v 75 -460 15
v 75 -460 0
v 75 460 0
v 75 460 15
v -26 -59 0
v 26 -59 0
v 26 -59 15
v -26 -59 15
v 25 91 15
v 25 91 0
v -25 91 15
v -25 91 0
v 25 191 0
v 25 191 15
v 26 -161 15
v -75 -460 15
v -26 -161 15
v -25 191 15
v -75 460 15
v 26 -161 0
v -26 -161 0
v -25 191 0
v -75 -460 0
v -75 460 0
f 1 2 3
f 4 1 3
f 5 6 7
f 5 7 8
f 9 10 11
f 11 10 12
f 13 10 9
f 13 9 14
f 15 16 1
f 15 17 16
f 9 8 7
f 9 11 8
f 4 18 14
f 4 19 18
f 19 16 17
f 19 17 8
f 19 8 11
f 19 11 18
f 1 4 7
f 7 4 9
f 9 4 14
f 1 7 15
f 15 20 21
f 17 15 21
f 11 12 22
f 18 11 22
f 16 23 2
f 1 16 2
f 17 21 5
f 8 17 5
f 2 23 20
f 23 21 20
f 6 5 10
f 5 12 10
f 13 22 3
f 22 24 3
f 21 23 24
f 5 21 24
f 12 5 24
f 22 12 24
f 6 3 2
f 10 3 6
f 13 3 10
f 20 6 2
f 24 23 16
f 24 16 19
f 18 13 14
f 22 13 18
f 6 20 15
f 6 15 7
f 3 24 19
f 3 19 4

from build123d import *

# Parameters (mm, degrees)
CROQUIS1_W              = 150
CROQUIS1_H              = 920
SALIENTE_EXTRUIR1_DEPTH = 15
CROQUIS3_W              = 52
CROQUIS3_H              = 102
CORTAR_EXTRUIR1_DEPTH   = 200
CROQUIS7_W              = 50
CROQUIS7_H              = 100
CORTAR_EXTRUIR2_DEPTH   = 467.315343947


with BuildPart() as part:
    # Croquis1 → Saliente-Extruir1 (new body)
    with BuildSketch(Plane.XY):
        Rectangle(CROQUIS1_W, CROQUIS1_H)
    extrude(amount=SALIENTE_EXTRUIR1_DEPTH)

    # Croquis3 → Cortar-Extruir1 (cut, symmetric)
    with BuildSketch(Plane(origin=(0, 0, 0), x_dir=(-1, 0, 0), z_dir=(0, 0, -1))):
        with Locations((0, -110)):
            Rectangle(CROQUIS3_W, CROQUIS3_H)
    extrude(amount=CORTAR_EXTRUIR1_DEPTH, both=True, mode=Mode.SUBTRACT)

    # Croquis7 → Cortar-Extruir2 (cut, through all)
    with BuildSketch(Plane(origin=(0, 0, 0), x_dir=(-1, 0, 0), z_dir=(0, 0, -1))):
        with Locations((0, 141)):
            Rectangle(CROQUIS7_W, CROQUIS7_H)
    extrude(amount=-CORTAR_EXTRUIR2_DEPTH, mode=Mode.SUBTRACT)


solid = part.part
